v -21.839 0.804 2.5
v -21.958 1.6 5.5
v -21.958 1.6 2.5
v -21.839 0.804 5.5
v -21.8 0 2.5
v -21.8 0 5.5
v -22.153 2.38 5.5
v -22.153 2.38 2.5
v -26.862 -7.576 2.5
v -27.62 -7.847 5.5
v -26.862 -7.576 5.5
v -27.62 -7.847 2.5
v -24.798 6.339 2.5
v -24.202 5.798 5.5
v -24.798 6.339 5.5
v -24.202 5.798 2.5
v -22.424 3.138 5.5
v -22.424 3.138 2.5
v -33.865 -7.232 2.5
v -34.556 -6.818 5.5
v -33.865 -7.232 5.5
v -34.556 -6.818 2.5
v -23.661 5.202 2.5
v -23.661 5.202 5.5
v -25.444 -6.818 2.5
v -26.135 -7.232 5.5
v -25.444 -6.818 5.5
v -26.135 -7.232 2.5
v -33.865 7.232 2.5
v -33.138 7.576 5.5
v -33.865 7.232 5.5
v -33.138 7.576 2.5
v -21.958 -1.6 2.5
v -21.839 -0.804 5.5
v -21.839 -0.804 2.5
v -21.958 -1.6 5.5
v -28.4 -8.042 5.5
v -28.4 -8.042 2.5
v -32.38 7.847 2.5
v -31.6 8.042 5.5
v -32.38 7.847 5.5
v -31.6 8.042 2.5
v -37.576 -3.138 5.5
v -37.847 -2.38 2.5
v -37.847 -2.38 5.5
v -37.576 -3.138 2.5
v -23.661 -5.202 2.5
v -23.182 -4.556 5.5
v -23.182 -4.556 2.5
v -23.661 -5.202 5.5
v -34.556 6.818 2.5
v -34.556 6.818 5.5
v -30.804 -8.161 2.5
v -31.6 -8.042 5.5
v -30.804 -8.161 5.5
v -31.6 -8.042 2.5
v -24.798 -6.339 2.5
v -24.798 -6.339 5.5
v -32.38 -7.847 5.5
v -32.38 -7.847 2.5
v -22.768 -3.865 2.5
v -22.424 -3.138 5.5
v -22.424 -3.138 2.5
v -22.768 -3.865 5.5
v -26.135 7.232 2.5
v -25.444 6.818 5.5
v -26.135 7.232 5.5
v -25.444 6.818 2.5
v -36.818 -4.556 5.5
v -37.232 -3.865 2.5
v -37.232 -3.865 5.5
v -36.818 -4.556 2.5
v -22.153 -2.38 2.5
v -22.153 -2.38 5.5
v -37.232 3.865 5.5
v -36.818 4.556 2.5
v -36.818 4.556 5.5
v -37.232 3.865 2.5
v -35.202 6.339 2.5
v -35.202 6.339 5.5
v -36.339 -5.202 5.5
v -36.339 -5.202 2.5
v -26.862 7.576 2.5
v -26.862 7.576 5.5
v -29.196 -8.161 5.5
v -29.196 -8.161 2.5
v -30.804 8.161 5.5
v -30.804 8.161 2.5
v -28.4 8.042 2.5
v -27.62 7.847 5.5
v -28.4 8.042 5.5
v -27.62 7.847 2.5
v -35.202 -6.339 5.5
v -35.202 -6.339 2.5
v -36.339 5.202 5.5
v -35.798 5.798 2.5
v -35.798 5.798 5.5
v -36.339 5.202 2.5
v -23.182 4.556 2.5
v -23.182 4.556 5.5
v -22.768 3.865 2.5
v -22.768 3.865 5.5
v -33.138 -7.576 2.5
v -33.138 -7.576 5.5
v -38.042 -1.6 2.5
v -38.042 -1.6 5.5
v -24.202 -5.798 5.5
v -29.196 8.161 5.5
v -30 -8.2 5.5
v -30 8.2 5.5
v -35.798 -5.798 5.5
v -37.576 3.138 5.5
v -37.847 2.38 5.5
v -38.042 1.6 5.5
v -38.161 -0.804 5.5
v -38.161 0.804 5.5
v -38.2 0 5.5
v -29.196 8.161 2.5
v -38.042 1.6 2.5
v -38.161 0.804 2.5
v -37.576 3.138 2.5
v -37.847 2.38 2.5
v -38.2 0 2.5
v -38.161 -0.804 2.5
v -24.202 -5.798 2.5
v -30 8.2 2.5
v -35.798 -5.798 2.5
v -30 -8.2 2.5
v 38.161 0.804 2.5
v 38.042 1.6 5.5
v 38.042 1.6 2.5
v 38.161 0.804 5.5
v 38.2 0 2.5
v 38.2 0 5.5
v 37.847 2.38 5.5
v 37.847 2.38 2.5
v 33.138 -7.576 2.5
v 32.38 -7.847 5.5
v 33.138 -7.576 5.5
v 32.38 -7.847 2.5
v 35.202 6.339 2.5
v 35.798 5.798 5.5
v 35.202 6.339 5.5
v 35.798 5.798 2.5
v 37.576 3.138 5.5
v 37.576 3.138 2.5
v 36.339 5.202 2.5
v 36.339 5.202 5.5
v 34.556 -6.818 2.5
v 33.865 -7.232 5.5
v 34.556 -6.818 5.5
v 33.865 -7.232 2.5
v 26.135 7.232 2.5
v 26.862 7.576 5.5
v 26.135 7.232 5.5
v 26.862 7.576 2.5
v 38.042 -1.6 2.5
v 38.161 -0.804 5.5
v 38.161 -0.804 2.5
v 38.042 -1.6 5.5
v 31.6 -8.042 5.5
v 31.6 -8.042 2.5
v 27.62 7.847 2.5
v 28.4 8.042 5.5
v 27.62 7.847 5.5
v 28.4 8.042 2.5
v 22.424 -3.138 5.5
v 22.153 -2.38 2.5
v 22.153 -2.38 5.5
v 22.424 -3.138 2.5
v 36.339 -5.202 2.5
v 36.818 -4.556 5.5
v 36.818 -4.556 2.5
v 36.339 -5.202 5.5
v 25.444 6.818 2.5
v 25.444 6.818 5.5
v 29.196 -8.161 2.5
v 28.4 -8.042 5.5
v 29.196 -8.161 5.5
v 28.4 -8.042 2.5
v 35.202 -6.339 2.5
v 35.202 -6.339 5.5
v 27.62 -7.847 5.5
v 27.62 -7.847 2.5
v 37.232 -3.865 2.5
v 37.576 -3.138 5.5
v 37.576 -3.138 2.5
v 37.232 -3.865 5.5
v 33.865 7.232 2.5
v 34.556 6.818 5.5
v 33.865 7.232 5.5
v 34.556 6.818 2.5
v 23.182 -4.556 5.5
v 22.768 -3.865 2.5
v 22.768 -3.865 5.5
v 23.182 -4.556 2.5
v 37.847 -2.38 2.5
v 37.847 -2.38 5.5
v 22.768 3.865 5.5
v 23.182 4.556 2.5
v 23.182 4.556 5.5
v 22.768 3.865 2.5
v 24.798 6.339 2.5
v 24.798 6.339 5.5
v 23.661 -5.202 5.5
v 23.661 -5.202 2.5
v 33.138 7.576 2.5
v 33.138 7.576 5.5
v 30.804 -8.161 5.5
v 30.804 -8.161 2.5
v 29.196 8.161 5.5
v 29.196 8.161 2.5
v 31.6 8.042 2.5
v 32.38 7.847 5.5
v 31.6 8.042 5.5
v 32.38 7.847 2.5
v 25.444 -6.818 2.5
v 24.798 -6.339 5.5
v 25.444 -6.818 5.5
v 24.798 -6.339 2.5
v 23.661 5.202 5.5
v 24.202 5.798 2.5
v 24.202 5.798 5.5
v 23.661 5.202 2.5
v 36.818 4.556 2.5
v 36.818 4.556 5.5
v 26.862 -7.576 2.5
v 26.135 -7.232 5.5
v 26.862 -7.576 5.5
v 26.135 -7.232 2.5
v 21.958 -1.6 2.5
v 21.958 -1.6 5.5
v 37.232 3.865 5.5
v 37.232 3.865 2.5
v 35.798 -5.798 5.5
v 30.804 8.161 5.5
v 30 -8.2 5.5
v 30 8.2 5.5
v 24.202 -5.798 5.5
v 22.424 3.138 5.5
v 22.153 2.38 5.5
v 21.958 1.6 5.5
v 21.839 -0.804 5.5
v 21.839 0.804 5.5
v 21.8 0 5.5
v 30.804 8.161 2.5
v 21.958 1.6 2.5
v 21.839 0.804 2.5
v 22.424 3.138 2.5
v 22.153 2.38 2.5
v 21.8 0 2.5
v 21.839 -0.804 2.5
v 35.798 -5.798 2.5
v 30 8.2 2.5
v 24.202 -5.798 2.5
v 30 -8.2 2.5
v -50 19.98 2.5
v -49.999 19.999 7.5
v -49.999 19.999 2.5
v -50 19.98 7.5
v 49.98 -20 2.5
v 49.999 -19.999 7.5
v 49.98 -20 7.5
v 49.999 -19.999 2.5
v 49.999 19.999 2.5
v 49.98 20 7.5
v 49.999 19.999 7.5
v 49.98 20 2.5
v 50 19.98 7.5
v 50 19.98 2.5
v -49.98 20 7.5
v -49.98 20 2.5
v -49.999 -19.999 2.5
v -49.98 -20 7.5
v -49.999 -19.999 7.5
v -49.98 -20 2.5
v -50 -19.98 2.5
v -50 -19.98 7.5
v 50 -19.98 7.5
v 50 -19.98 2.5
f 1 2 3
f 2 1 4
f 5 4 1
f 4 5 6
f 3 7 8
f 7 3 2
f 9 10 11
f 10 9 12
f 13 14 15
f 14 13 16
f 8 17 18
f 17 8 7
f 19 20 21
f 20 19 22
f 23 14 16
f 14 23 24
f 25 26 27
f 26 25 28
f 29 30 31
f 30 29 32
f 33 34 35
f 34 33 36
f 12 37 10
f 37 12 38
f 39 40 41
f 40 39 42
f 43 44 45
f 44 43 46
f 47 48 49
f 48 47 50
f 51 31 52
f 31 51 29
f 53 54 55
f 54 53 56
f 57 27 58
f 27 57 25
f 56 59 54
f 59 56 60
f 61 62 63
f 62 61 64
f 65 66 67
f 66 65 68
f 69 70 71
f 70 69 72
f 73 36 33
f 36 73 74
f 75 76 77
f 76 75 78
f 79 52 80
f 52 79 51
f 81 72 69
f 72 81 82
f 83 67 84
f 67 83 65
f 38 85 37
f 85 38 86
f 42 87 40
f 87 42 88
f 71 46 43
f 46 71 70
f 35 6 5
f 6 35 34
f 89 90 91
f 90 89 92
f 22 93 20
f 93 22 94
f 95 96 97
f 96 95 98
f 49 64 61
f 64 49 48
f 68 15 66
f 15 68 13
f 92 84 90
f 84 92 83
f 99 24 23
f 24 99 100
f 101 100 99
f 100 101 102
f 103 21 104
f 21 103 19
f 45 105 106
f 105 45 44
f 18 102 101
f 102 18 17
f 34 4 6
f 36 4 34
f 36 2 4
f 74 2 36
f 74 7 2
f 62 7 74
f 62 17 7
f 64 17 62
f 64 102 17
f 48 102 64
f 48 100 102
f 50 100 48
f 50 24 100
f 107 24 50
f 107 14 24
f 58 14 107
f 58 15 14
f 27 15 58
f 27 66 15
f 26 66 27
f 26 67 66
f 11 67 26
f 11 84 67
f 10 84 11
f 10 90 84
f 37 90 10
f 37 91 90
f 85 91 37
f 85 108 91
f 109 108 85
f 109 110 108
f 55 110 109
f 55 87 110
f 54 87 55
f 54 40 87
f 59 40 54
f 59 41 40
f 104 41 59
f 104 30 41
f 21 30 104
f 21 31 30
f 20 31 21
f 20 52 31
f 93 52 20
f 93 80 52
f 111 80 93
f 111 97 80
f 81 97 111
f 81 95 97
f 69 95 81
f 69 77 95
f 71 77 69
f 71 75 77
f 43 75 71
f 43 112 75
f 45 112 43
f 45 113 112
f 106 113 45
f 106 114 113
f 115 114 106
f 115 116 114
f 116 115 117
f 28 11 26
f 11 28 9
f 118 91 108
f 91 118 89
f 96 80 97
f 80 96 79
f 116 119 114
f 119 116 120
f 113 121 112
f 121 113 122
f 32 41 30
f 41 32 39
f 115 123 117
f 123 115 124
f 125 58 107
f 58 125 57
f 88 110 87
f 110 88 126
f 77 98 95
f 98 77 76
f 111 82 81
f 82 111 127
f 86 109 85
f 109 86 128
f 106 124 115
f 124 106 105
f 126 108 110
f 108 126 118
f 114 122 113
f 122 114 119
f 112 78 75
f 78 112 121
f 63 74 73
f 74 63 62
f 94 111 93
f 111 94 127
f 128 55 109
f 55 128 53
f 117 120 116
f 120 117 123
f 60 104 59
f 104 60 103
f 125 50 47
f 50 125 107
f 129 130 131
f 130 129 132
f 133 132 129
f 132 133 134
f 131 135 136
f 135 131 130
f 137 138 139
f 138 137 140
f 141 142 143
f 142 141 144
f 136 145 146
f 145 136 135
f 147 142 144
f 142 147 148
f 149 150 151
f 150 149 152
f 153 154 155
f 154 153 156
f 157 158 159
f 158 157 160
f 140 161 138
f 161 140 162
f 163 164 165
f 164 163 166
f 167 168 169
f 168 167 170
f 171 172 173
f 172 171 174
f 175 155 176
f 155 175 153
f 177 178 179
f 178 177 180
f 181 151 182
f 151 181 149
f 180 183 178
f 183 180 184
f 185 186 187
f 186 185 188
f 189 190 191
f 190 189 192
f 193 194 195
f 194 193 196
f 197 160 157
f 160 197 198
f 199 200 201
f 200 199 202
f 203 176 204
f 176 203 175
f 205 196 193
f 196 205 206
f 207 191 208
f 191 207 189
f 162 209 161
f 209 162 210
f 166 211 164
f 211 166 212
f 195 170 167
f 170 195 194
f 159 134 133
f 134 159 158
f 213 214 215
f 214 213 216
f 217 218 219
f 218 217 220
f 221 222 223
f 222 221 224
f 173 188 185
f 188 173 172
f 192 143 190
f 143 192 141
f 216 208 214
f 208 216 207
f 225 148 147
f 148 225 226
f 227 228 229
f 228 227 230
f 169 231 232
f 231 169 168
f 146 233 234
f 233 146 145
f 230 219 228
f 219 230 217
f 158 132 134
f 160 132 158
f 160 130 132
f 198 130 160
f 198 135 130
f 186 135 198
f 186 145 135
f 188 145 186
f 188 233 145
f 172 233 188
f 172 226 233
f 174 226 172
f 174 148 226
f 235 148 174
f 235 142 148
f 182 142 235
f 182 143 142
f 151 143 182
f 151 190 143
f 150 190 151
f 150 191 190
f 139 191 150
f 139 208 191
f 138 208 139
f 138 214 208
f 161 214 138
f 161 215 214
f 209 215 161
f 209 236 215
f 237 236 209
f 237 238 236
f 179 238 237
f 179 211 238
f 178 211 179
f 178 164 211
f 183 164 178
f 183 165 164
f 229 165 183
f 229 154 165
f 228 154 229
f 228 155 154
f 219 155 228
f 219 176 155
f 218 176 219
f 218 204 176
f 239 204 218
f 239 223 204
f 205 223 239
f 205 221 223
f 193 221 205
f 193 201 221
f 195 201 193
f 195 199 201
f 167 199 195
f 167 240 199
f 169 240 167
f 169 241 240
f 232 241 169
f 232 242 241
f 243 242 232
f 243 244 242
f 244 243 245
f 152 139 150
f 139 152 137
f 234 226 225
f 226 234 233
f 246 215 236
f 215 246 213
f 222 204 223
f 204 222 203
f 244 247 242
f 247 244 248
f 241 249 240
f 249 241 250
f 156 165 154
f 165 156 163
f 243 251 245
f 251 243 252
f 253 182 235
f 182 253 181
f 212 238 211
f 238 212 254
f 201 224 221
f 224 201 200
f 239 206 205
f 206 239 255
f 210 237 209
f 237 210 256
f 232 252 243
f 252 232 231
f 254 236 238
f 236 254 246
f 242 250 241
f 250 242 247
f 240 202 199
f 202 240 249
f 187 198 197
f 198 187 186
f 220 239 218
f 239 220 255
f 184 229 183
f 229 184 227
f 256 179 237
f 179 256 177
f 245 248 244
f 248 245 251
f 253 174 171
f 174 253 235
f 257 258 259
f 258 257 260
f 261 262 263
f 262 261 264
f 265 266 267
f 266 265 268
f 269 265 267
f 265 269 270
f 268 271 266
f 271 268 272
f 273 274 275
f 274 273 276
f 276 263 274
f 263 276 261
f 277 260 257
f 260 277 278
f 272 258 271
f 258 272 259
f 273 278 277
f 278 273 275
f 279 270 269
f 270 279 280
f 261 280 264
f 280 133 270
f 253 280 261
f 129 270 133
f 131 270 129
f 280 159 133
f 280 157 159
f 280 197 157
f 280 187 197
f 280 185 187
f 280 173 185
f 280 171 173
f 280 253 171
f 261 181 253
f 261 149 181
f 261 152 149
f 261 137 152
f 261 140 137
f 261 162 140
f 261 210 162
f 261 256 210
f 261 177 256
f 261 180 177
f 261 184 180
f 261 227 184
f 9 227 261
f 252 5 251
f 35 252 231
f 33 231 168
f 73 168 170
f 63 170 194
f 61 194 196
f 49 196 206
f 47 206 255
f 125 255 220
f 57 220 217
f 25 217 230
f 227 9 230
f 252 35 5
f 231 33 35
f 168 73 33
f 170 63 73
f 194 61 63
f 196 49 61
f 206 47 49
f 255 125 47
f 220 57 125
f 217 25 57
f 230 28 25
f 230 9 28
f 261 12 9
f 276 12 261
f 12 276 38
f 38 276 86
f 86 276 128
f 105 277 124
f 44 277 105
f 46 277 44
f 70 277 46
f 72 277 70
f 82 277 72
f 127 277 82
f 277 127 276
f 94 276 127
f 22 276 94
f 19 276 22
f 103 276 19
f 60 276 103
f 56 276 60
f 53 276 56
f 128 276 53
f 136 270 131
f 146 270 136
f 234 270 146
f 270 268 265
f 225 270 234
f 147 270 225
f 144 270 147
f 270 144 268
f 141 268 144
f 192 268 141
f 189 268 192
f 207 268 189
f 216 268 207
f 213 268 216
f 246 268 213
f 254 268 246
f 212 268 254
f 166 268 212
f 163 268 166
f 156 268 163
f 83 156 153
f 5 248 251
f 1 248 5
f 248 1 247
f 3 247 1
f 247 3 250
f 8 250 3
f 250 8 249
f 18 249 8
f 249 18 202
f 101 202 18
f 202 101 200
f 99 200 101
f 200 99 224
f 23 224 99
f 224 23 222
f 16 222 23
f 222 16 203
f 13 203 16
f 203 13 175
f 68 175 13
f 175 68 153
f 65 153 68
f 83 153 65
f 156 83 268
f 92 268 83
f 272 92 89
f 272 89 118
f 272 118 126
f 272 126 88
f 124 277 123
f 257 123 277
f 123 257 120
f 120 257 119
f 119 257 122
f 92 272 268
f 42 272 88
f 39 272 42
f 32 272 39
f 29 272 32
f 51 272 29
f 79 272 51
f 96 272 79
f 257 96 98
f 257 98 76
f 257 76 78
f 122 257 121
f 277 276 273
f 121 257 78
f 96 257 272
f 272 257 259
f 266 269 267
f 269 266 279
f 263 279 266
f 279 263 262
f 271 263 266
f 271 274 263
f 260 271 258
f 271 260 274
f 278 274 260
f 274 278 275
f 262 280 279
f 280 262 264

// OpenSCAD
/* [Dimensions] */
// Overall length of the plate
length = 100; // [20:200]
// Overall width of the plate
width = 40; // [10:100]
// Plate thickness
thickness = 5; // [2:10]
// Hole diameter
hole_diameter = 16; // [3:0.5:50]
// Center-to-center distance between holes
hole_spacing = 60; // [10:0.5:180]

/* [Options] */
// Add chamfered edges for cleaner print
chamfer_edges = true;

/* [Hidden] */
$fn = 64;

// Derived values
hole_radius = hole_diameter / 2;
chamfer_size = chamfer_edges ? 0.8 : 0;

module plate_body() {
    if (chamfer_edges) {
        linear_extrude(height = thickness, convexity = 2)
            offset(r = -chamfer_size)
                offset(r = chamfer_size)
                    square([length, width], center = true);
    } else {
        cube([length, width, thickness], center = true);
    }
}

module holes() {
    // Two through-holes centered on X axis, spaced apart
    for (x = [-hole_spacing/2, hole_spacing/2]) {
        translate([x, 0, -0.5])
            cylinder(h = thickness + 1, r = hole_radius + 0.2);
    }
}

// Main geometry
difference() {
    translate([0, 0, thickness/2])
        plate_body();
    holes();
}
